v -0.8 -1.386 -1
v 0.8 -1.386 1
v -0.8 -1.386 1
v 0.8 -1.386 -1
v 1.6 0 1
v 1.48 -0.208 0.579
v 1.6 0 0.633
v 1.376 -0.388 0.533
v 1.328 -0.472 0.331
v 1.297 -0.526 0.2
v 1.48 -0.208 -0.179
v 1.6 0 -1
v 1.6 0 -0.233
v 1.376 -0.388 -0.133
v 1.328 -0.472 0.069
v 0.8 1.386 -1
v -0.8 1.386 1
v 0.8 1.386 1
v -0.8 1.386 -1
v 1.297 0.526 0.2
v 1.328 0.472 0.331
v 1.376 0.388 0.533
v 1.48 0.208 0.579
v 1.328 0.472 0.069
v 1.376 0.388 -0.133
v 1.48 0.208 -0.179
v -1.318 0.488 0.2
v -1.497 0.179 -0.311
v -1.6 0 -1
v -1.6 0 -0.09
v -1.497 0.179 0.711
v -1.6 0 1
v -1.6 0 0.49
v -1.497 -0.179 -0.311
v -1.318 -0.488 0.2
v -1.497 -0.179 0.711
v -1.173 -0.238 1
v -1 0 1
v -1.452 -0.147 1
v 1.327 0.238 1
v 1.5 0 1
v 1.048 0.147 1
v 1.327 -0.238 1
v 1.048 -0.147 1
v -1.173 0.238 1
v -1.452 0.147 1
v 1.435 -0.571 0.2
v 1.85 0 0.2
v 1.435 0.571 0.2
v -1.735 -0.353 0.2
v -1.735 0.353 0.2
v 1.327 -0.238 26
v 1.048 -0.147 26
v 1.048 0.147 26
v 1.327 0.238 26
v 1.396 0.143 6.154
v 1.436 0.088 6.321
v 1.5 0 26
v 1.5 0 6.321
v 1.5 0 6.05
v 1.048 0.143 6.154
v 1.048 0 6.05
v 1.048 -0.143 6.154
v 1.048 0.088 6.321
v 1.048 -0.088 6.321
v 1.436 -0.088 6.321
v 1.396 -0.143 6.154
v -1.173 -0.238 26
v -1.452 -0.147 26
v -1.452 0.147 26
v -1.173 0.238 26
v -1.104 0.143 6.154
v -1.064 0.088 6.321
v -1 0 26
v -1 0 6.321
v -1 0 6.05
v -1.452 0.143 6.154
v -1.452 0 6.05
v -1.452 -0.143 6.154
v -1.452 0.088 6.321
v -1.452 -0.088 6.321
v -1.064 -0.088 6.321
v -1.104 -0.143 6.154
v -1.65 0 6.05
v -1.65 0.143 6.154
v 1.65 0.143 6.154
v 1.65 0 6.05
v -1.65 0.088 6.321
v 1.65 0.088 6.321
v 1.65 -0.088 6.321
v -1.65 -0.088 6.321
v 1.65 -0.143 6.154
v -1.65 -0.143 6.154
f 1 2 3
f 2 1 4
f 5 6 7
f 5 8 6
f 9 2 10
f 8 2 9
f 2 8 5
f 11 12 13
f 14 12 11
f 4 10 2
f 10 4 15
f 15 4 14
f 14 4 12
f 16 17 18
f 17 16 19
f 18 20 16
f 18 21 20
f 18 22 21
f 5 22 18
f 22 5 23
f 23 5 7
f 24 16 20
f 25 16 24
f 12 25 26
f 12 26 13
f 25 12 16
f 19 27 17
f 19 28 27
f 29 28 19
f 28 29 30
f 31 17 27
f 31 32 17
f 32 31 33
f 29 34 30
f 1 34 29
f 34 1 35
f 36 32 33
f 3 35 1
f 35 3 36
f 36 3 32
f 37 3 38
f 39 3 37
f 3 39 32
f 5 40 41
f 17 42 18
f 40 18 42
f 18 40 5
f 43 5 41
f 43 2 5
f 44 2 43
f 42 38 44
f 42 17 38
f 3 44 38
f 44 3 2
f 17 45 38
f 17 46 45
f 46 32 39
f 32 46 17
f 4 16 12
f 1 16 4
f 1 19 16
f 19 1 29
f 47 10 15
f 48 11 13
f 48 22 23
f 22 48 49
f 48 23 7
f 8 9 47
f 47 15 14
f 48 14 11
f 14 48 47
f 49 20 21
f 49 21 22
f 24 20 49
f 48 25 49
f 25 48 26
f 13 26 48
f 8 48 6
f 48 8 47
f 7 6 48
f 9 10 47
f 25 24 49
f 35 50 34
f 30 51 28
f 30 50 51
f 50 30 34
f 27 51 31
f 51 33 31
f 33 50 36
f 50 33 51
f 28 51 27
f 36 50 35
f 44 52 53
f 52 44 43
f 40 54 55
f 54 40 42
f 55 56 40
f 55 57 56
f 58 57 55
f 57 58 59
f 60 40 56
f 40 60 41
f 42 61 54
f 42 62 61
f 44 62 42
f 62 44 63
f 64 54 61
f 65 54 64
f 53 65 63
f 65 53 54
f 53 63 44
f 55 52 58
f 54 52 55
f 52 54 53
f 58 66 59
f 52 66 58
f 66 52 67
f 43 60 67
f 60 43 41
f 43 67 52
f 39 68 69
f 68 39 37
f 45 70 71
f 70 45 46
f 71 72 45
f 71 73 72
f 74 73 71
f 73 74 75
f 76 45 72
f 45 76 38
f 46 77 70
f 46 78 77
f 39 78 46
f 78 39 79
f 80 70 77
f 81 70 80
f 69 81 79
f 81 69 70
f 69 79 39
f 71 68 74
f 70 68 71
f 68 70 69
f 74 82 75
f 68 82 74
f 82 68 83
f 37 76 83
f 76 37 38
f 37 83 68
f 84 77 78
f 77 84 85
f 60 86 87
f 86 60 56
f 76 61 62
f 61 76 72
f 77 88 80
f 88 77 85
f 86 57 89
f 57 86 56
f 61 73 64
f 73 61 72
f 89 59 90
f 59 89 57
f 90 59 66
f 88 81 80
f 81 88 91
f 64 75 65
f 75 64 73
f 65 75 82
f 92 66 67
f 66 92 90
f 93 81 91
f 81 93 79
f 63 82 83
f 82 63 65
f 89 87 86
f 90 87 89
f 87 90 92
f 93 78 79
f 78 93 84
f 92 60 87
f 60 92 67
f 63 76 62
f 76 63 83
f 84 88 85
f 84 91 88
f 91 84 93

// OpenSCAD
// Parameters
body_d = 3.2; //[1.6:6.4:0.1]
body_t = 2; //[1:4:0.1]
lead_d = 0.5; //[0.25:1:0.05]
lead_len = 25; //[12.5:50:0.5]
lead_pitch = 2.5; //[1.25:5:0.1]
lead_straight_len_from_body = 6; //[3:12:0.5]
exit_fillet_r = 0.6; //[0.3:1.2:0.05]
overlap = 0.8; //[0.5:2:0.1]
marking_depth = 0.2; //[0.1:0.5:0.05]
marking_d = 1.2; //[0.6:2.4:0.1]
tinning_len = 3; //[1.5:6:0.5]
ref_bar_d = 0.3; //[0.15:0.6:0.05]

// Thermistor Body
module thermistor_body() {
  color([0.85, 0.85, 0.8]) // Off-white for epoxy
  cylinder(r=body_d/2, h=body_t, center=true);
}

// Lead
module lead(position) {
  translate(position)
  color([0.2, 0.2, 0.2]) // Dark color for leads
  cylinder(r=lead_d/2, h=lead_len + overlap, center=true);
}

// Lead Exit Fillet
module lead_exit_fillet(position) {
  translate(position)
  sphere(r=exit_fillet_r);
}

// Body Marking Cutter
module body_marking_cutter() {
  translate([0, 0, body_t/2 - (marking_depth + overlap)/2 + overlap/2])
  cylinder(r=marking_d/2, h=marking_depth + overlap, center=true);
}

// Lead Tinning Length
module lead_tinning_length(position) {
  translate(position)
  color([0.72, 0.45, 0.2]) // Copper color for tinning
  cylinder(r=lead_d/2, h=tinning_len, center=true);
}

// Lead Spacing Reference
module lead_spacing_reference() {
  translate([0, 0, body_t/2 + lead_straight_len_from_body - overlap])
  rotate([0, 90, 0])
  color([0.4, 0.4, 0.43]) // DimGray for reference bar
  cylinder(r=ref_bar_d/2, h=lead_pitch + overlap, center=true);
}

// Main Assembly
module thermistor_model() {
  // Body with exit fillet
  union() {
    thermistor_body();
    lead_exit_fillet([lead_pitch/2, 0, body_t/2 - overlap]);
    lead_exit_fillet([-lead_pitch/2, 0, body_t/2 - overlap]);
  }
  
  // Body with marking
  difference() {
    union() {
      thermistor_body();
      lead_exit_fillet([lead_pitch/2, 0, body_t/2 - overlap]);
      lead_exit_fillet([-lead_pitch/2, 0, body_t/2 - overlap]);
    }
    body_marking_cutter();
  }
  
  // Leads
  union() {
    lead([lead_pitch/2, 0, body_t/2 + (lead_len + overlap)/2 - overlap]);
    lead([-lead_pitch/2, 0, body_t/2 + (lead_len + overlap)/2 - overlap]);
  }
  
  // Lead Tinning
  union() {
    lead_tinning_length([lead_pitch/2, 0, body_t/2 + lead_len - tinning_len/2]);
    lead_tinning_length([-lead_pitch/2, 0, body_t/2 + lead_len - tinning_len/2]);
  }
  
  // Lead Spacing Reference
  lead_spacing_reference();
}

// Final Output
thermistor_model();
